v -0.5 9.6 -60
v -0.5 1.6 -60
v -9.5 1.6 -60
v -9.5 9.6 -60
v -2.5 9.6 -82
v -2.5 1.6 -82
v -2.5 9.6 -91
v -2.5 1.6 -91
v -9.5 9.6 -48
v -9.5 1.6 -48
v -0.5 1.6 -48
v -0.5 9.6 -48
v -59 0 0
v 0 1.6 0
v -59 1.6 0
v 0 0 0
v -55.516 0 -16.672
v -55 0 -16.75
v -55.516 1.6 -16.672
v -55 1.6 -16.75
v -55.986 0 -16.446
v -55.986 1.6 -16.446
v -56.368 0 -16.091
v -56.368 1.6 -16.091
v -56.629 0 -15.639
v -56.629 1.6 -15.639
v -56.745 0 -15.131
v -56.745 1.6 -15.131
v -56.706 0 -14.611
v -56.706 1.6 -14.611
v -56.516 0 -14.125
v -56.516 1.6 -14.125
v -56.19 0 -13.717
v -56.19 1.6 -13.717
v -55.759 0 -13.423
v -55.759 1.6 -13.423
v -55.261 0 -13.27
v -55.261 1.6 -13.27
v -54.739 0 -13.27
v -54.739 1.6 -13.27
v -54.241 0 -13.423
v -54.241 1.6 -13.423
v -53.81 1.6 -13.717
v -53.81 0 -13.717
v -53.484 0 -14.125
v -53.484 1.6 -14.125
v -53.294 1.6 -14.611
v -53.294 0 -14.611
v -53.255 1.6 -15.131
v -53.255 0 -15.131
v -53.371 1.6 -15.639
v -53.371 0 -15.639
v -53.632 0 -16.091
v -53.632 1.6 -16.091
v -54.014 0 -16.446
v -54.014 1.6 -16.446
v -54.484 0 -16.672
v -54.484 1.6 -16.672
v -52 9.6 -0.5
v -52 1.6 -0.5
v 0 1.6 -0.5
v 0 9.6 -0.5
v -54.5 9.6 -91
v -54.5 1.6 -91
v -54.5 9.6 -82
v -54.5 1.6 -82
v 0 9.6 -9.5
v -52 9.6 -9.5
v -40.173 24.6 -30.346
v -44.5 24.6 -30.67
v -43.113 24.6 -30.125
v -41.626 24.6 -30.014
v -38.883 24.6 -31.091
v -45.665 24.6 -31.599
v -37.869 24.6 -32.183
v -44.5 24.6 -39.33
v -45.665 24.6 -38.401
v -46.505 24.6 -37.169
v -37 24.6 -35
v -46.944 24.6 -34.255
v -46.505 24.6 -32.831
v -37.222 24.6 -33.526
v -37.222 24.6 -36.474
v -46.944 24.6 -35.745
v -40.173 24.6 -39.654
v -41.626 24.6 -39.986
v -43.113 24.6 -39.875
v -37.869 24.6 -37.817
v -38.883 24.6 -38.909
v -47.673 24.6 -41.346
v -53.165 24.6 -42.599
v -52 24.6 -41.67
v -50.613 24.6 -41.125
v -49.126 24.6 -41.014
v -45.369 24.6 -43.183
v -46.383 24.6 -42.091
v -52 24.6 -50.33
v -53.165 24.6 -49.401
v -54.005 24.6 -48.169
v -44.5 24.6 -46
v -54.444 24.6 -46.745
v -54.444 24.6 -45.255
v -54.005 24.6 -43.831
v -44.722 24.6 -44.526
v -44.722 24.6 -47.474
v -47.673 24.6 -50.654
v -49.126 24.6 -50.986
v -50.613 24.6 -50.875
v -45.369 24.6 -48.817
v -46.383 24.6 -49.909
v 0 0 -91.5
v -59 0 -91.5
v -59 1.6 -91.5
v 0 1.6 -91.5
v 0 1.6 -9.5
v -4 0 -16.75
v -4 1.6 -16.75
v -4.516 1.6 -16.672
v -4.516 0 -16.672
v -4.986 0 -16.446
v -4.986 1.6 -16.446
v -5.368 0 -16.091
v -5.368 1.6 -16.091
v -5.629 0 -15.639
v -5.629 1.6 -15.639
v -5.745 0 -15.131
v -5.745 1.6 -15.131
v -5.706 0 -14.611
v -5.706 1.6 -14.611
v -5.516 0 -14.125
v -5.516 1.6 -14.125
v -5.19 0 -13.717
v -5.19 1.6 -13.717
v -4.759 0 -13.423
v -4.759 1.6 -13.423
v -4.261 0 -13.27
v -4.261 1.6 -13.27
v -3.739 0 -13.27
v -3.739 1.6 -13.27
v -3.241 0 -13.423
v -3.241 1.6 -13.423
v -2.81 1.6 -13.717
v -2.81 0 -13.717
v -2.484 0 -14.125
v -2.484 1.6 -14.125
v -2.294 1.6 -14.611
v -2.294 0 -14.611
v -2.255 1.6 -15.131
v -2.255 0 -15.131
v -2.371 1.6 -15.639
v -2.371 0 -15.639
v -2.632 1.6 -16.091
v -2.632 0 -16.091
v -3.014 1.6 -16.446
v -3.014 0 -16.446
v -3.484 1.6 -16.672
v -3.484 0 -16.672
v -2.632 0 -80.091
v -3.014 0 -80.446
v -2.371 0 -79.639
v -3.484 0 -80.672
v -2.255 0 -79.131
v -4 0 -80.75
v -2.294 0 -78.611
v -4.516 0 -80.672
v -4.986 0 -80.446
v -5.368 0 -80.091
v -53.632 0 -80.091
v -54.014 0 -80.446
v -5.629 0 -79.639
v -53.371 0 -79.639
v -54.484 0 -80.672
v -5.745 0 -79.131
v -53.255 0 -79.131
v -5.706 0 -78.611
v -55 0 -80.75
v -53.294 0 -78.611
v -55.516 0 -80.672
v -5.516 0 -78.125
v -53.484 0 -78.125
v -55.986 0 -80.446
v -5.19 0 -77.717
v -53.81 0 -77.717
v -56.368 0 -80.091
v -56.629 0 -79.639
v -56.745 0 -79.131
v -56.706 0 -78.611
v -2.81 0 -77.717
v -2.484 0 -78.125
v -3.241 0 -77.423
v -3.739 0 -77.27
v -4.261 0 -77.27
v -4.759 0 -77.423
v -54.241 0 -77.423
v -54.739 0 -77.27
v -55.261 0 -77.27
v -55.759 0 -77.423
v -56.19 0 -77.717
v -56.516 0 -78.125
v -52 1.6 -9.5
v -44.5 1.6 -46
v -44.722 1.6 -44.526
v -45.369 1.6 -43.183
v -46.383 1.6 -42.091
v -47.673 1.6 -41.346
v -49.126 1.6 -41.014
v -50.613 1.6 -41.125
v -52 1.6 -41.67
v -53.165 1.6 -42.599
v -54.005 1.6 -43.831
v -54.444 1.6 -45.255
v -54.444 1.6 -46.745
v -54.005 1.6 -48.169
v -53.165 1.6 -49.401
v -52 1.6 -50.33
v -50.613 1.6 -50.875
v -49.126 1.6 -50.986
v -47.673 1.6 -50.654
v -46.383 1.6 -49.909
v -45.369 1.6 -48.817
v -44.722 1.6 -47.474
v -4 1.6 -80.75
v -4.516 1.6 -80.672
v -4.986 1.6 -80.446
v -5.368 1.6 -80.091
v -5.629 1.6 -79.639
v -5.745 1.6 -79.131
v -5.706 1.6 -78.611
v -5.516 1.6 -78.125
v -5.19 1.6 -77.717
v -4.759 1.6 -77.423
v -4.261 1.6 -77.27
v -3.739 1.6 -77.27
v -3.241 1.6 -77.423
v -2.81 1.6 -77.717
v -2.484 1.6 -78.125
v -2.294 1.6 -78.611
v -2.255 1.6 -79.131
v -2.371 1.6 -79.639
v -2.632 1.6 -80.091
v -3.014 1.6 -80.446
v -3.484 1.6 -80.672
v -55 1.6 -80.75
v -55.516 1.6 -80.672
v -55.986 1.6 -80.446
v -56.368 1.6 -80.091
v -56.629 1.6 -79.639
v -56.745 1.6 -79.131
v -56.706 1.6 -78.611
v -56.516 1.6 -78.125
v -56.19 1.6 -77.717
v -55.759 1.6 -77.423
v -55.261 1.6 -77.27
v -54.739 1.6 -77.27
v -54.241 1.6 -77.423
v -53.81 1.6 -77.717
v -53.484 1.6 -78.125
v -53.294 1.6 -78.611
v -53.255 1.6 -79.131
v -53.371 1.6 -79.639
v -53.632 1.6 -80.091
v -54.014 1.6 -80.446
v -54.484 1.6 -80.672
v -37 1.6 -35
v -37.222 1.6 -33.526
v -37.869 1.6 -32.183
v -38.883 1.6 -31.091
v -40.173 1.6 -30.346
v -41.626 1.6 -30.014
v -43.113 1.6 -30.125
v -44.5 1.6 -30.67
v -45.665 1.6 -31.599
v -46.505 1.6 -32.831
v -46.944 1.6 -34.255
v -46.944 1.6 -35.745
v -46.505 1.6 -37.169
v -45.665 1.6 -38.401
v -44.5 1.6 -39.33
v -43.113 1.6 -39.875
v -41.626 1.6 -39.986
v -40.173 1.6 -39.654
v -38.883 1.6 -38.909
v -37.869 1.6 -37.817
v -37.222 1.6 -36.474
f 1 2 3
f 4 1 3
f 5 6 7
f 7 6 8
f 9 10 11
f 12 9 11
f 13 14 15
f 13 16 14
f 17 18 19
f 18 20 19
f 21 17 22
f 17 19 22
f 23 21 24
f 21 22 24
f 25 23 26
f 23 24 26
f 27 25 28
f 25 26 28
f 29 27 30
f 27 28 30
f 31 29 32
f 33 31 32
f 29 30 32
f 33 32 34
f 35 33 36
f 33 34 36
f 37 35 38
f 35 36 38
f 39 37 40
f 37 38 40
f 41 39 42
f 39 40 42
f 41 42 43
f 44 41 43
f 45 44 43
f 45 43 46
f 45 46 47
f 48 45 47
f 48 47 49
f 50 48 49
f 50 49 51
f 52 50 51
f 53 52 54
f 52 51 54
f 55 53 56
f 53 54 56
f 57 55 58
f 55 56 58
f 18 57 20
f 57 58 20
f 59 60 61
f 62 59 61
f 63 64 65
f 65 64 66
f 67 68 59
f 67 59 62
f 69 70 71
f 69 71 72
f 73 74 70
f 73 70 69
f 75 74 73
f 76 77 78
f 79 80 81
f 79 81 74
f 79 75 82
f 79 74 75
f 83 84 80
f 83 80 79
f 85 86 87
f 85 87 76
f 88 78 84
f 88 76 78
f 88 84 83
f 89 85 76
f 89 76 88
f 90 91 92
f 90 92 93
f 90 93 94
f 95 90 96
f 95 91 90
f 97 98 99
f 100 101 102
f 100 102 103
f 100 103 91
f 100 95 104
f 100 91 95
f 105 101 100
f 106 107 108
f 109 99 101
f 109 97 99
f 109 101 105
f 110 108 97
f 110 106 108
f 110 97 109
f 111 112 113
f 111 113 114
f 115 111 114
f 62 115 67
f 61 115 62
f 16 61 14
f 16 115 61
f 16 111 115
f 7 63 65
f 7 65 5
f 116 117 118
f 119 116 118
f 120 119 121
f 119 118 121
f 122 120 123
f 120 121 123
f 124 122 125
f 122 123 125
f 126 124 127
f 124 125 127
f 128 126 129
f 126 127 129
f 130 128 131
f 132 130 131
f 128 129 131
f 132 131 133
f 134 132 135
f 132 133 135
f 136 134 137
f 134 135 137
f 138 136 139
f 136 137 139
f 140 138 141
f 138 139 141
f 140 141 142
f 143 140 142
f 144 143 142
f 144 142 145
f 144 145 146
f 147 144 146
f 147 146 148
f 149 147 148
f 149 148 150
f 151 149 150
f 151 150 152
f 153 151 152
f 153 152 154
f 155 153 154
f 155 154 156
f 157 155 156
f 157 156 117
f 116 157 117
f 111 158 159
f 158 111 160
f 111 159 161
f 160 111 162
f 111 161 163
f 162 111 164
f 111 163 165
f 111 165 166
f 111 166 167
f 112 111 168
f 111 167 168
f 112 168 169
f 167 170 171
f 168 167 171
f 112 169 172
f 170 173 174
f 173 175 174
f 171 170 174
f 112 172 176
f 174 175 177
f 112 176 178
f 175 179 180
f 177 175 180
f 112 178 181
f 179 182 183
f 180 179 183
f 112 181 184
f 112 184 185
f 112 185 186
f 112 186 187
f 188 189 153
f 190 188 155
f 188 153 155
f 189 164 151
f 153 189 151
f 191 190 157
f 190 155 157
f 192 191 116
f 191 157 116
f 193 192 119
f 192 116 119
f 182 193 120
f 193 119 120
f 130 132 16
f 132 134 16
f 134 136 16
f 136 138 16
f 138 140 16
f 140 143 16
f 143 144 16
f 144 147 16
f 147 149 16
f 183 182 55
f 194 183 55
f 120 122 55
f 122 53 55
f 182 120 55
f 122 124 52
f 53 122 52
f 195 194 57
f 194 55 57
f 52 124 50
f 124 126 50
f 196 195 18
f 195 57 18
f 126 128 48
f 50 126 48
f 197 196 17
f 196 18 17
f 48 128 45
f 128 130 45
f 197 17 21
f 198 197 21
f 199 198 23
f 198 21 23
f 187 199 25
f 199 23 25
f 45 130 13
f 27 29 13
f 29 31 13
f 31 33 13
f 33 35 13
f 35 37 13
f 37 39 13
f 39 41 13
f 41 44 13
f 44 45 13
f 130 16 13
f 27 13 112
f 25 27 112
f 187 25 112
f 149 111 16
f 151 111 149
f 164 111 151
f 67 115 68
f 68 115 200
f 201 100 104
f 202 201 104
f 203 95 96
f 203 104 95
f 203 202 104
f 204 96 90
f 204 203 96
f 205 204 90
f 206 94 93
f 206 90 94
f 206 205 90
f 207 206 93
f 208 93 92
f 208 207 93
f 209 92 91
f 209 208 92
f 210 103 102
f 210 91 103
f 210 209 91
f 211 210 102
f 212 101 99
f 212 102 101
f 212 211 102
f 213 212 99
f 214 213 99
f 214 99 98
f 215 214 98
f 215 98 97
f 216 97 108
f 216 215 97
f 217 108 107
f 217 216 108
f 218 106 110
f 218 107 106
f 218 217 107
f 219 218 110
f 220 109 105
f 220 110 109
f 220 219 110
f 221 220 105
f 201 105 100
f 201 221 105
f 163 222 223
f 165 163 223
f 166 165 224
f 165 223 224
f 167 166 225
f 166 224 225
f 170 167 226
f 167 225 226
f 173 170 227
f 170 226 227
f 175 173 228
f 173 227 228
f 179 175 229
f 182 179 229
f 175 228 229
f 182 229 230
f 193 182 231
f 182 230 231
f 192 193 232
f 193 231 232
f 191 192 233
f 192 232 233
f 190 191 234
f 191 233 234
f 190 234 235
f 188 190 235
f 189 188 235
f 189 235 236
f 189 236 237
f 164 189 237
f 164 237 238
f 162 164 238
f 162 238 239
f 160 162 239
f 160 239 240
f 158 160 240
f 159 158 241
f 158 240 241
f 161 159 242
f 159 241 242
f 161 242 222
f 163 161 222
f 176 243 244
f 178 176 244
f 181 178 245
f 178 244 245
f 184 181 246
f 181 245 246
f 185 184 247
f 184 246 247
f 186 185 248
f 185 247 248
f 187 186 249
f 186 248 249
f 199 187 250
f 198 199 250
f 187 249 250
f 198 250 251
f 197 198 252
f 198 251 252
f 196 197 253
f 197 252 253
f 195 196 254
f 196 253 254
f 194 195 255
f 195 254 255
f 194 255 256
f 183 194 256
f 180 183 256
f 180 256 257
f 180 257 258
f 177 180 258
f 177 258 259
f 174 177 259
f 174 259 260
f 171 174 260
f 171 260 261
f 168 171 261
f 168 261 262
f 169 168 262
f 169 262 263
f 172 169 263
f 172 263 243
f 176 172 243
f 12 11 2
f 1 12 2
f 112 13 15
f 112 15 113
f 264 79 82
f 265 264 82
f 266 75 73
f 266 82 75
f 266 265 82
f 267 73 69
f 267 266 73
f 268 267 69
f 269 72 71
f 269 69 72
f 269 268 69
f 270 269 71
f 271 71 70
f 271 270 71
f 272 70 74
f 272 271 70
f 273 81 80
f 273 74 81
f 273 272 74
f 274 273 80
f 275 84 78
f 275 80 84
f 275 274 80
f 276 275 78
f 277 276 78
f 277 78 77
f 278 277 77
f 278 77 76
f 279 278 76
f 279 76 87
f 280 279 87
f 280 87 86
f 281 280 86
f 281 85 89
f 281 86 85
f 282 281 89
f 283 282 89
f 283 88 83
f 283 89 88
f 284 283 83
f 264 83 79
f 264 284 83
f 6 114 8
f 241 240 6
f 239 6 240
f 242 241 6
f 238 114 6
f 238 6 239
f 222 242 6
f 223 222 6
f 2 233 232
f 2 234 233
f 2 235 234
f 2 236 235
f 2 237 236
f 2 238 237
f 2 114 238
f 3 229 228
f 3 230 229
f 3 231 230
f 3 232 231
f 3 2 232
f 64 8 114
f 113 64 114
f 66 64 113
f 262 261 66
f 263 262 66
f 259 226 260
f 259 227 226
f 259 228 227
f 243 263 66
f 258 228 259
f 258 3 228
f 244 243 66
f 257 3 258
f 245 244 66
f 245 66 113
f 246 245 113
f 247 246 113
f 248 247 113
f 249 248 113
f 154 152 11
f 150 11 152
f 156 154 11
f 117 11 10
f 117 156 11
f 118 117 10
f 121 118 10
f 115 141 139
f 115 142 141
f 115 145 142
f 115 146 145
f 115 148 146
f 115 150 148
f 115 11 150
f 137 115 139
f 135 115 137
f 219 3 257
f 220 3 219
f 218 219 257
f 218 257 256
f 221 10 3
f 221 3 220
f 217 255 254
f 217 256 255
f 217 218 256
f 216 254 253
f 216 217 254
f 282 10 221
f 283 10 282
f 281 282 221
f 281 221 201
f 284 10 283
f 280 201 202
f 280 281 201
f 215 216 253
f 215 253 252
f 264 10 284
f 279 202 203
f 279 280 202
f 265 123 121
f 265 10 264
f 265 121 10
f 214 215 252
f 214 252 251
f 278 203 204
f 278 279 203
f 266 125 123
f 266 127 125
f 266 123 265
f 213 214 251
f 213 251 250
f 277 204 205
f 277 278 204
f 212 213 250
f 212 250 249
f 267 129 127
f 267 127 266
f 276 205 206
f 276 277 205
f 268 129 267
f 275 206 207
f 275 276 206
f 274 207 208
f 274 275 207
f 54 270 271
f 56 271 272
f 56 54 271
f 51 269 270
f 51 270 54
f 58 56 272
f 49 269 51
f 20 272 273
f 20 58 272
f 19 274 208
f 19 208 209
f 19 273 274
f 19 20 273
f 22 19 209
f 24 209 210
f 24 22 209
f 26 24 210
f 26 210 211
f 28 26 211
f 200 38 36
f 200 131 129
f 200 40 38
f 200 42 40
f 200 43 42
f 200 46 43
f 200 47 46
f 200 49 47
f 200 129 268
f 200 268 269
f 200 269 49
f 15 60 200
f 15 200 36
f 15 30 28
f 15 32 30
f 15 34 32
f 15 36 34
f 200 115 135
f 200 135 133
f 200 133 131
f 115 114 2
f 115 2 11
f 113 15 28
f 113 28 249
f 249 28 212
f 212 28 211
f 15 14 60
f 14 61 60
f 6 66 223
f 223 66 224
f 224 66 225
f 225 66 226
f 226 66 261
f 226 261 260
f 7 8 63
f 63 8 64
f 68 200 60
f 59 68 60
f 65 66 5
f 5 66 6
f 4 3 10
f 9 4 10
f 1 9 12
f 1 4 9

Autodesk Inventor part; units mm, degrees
ref_plane "YZ Plane" through (0, 0, 0) normal (1, 0, 0) x (0, 1, 0)
ref_plane "XZ Plane" through (0, 0, 0) normal (0, 1, 0) x (-1, 0, 0)
ref_plane "XY Plane" through (0, 0, 0) normal (0, 0, 1) x (1, 0, 0)
sketch "Sketch1" plane through (0, 0, 0) normal (0, 1, 0) x (-1, 0, 0)
  line L0 (0, 0) -> (59, 0)
  line L1 (59, 0) -> (59, -91.5)
  line L2 (59, -91.5) -> (0, -91.5)
  line L3 (0, -91.5) -> (0, 0)
  line L4 (4, -15) -> (55, -15) construction
  line L5 (55, -15) -> (55, -79) construction
  line L6 (55, -79) -> (4, -79) construction
  line L7 (4, -79) -> (4, -15) construction
  dimension "d0" = 59
  dimension "d1" = 91.5
  dimension "d2" = 51
  dimension "d3" = 64
  dimension "d4" = 12.5
  dimension "d5" = 4
extrude "Extrusion1" add sketch "Sketch1" along normal blind 1.6
hole "Hole1" at (-55, 0, -15) at (-55, 0, -79) at (-4, 0, -79) at (-4, 0, -15) direction (0, 1, 0) diameter 3.5 end through all
sketch "Sketch2" plane through (0, 1.6, 0) normal (0, 1, 0) x (1, 0, 0)
  circle A0 centre (-49.5, 46) radius 5
  circle A1 centre (-42, 35) radius 5
  line L0 (-59, 0) -> (0, 0) projected
  line L1 (-59, 91.5) -> (-59, 0) projected
  line L2 (-52, 0.5) -> (0, 0.5)
  line L3 (0, 0.5) -> (0, 9.5)
  line L4 (0, 9.5) -> (-52, 9.5)
  line L5 (-52, 9.5) -> (-52, 0.5)
  line L6 (-54.5, 82) -> (-2.5, 82)
  line L7 (-2.5, 82) -> (-2.5, 91)
  line L8 (-2.5, 91) -> (-54.5, 91)
  line L9 (-54.5, 91) -> (-54.5, 82)
  line L10 (-9.5, 48) -> (-0.5, 48)
  line L11 (-0.5, 48) -> (-0.5, 60)
  line L12 (-0.5, 60) -> (-9.5, 60)
  line L13 (-9.5, 60) -> (-9.5, 48)
  line L14 (0, 0) -> (0, 91.5) projected
  dimension "d15" = 10
  dimension "d16" = 10
  dimension "d18" = 46
  dimension "d19" = 9.5
  dimension "d20" = 35
  dimension "d21" = 17
  dimension "d22" = 52
  dimension "d23" = 9
  dimension "d24" = 7
  dimension "d25" = 9.5
  dimension "d26" = 52
  dimension "d27" = 9
  dimension "d28" = 9.5
  dimension "d29" = 4.5
  dimension "d30" = 9
  dimension "d31" = 12
  dimension "d32" = 9.5
  dimension "d33" = 48
extrude "Extrusion2" add sketch "Sketch2" along normal blind 23 contours A0 | A1
extrude "Extrusion3" add sketch "Sketch2" along normal blind 8 contours L5 L4 L3 L2 | L9 L8 L7 L6 | L13 L12 L11 L10
properties part number "Switch Mode PS PCB"
